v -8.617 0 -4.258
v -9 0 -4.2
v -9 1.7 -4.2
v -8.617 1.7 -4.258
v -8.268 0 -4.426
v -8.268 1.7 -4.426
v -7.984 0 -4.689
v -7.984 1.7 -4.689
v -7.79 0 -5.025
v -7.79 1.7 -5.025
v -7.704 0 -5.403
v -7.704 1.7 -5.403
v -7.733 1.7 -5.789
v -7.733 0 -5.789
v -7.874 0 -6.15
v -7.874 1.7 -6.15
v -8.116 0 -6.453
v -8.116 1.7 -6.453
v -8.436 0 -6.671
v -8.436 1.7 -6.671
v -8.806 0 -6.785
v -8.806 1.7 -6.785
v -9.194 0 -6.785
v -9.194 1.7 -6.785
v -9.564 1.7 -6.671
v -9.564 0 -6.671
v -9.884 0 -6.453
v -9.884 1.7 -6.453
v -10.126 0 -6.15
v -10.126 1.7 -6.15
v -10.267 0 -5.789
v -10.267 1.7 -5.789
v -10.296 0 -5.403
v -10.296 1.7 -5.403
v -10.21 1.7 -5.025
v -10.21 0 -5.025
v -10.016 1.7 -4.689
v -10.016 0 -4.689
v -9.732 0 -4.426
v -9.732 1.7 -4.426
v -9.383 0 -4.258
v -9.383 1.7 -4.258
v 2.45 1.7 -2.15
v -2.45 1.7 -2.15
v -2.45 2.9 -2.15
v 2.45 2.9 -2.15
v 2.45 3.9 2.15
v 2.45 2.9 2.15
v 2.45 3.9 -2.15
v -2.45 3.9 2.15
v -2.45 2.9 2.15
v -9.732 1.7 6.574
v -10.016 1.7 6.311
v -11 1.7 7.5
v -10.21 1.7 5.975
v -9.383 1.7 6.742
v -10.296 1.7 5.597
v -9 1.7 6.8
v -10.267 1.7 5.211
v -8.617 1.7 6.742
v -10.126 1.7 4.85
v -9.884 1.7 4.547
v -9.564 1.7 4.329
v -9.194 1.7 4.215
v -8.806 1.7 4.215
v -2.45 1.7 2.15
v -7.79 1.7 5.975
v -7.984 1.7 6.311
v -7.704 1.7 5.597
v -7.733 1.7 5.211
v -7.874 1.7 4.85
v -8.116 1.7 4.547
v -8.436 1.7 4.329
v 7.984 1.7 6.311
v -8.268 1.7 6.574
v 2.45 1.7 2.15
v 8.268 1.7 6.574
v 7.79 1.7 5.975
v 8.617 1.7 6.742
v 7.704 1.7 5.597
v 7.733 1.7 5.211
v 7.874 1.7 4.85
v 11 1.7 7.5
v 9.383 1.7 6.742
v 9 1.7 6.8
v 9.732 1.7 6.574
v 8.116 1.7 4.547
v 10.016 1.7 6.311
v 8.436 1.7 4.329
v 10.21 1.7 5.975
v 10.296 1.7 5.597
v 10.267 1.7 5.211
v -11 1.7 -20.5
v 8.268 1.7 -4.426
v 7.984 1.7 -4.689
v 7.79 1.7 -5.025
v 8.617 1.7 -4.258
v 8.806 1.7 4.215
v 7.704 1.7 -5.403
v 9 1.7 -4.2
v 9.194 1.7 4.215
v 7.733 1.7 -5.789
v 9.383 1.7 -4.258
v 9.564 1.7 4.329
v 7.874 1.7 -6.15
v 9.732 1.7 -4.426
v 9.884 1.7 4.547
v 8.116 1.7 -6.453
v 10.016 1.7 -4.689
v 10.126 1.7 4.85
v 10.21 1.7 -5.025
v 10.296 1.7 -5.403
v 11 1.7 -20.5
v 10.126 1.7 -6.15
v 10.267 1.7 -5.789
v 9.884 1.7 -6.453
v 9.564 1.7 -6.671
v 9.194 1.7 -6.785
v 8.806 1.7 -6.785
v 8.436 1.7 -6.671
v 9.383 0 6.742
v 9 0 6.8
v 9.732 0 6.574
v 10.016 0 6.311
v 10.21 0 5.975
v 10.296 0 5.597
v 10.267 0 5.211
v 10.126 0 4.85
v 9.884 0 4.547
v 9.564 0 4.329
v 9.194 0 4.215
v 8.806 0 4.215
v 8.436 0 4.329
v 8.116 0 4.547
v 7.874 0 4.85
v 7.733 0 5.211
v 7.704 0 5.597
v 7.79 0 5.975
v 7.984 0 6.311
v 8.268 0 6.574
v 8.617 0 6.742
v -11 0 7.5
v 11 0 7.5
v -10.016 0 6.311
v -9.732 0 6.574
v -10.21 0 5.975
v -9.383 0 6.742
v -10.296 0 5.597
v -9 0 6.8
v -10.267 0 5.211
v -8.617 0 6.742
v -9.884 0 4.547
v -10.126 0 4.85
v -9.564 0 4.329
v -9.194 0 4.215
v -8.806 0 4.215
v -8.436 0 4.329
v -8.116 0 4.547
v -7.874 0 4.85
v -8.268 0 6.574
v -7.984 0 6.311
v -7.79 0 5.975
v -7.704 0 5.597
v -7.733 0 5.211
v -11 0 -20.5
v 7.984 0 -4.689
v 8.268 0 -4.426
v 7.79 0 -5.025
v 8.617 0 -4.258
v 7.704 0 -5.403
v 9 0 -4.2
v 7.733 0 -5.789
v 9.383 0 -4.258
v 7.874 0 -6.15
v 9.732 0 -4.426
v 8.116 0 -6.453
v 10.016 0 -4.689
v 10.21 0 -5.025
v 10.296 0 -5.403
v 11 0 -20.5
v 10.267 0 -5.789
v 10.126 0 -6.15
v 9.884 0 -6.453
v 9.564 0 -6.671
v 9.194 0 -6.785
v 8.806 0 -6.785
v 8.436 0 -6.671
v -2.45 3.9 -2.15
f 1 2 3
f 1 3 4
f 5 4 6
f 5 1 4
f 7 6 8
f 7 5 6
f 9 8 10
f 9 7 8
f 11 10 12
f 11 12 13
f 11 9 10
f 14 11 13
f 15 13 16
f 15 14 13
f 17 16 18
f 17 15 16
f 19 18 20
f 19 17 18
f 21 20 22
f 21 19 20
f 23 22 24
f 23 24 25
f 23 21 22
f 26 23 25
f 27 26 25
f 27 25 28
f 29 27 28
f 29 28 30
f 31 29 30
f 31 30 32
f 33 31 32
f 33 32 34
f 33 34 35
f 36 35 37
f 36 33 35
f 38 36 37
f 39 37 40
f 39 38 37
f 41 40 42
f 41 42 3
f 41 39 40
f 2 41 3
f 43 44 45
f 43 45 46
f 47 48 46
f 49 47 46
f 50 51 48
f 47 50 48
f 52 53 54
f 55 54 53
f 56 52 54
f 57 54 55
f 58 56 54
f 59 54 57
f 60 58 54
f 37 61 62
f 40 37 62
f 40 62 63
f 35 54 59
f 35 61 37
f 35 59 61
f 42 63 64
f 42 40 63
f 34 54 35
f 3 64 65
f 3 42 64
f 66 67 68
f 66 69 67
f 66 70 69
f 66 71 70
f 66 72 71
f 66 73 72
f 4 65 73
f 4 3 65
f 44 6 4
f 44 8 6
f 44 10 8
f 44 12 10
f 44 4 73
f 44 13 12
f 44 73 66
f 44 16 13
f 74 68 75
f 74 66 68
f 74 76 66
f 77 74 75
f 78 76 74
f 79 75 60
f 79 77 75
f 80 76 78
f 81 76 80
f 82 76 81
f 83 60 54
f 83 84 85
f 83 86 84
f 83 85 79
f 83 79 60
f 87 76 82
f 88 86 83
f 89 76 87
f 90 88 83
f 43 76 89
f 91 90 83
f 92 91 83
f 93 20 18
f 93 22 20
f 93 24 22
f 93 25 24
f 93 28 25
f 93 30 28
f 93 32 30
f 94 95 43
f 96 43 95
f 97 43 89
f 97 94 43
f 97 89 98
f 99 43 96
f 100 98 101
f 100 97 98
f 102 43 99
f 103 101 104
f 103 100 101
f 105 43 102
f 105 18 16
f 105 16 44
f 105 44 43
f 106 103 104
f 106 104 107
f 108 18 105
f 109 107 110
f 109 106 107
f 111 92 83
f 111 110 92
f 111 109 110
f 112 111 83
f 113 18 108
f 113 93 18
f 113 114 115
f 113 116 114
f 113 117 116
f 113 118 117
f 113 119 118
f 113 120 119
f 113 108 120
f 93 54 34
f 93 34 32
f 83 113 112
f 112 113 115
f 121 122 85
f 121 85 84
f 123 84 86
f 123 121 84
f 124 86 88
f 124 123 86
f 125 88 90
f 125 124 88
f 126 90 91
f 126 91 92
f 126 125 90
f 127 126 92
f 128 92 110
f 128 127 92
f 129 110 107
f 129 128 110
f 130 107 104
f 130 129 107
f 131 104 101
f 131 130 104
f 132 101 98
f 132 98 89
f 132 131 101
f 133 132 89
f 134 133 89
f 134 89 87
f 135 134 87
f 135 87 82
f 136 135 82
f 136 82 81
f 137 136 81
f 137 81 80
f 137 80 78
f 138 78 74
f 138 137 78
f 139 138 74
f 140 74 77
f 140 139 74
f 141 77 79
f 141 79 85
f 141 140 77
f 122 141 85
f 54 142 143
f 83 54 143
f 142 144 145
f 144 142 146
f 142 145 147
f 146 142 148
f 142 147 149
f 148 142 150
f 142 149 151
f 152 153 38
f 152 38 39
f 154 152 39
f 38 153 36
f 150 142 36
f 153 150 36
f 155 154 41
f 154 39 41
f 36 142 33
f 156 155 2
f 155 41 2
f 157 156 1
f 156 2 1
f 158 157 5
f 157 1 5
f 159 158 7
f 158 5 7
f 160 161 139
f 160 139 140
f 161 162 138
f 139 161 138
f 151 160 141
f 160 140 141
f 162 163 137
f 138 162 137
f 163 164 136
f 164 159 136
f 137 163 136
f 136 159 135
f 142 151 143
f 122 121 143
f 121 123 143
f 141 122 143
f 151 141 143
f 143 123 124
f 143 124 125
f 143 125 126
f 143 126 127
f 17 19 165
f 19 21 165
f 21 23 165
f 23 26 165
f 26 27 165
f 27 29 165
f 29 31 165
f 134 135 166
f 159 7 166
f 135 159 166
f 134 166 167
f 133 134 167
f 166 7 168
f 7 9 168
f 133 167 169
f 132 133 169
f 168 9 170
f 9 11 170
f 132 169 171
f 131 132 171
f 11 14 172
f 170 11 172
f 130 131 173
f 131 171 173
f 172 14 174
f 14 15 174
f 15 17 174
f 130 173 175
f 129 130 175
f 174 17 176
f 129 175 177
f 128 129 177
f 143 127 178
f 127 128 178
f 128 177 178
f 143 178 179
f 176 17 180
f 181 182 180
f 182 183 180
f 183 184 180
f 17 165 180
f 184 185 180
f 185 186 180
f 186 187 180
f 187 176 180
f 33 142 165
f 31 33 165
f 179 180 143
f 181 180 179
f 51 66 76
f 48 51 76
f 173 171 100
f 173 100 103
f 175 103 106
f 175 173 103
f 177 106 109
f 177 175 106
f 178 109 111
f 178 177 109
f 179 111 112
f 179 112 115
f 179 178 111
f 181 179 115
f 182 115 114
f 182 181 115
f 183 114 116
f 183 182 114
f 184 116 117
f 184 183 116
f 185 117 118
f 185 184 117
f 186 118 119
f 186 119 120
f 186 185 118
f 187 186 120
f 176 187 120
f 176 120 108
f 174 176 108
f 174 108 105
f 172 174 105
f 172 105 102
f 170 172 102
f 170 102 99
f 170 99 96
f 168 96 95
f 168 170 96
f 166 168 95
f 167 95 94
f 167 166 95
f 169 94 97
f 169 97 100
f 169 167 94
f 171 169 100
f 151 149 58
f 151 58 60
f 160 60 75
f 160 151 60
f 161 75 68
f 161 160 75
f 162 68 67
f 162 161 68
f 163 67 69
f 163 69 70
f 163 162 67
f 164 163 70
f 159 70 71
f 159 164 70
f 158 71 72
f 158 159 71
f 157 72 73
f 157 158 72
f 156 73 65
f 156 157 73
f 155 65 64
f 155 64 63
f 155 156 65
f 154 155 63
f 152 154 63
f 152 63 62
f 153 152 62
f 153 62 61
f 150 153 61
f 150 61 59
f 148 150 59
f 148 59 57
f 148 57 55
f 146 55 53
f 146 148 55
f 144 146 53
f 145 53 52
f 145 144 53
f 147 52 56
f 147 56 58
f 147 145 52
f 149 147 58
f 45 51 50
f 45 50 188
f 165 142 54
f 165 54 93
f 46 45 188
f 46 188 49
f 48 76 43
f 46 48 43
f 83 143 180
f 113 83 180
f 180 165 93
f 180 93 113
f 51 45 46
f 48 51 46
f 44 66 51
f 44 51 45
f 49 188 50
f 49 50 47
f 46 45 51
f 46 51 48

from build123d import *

# Parameters (mm, degrees)
SKETCH1_W           = 22
SKETCH1_H           = 28
SKETCH1_R           = 1.3
BOSS_EXTRUDE1_DEPTH = 1.7
SKETCH2_W           = 4.9
SKETCH2_H           = 4.3
BOSS_EXTRUDE2_DEPTH = 1.2
SKETCH3_W           = 4.9
SKETCH3_H           = 4.3
BOSS_EXTRUDE3_DEPTH = 1


with BuildPart() as part:
    # Sketch1 → Boss-Extrude1 (new body)
    with BuildSketch(Plane(origin=(0, 0, 0), x_dir=(1, 0, 0), z_dir=(0, 1, 0))):
        with Locations((0, 6.5)):
            Rectangle(SKETCH1_W, SKETCH1_H)
        with Locations(Location((-9, -5.5, 0), (0, 0, 270))):
            Circle(SKETCH1_R, mode=Mode.SUBTRACT)
        with Locations(Location((9, -5.5, 0), (0, 0, 270))):
            Circle(SKETCH1_R, mode=Mode.SUBTRACT)
        with Locations(Location((9, 5.5, 0), (0, 0, 270))):
            Circle(SKETCH1_R, mode=Mode.SUBTRACT)
        with Locations(Location((-9, 5.5, 0), (0, 0, 270))):
            Circle(SKETCH1_R, mode=Mode.SUBTRACT)
    extrude(amount=BOSS_EXTRUDE1_DEPTH)

    # Sketch2 → Boss-Extrude2 (add)
    with BuildSketch(Plane(origin=(0, 1.7, 0), x_dir=(1, 0, 0), z_dir=(0, 1, 0))):
        Rectangle(SKETCH2_W, SKETCH2_H)
    extrude(amount=BOSS_EXTRUDE2_DEPTH)


with BuildPart() as body_2:
    # Sketch3 → Boss-Extrude3 (new body)
    with BuildSketch(Plane(origin=(0, 2.9, 0), x_dir=(1, 0, 0), z_dir=(0, 1, 0))):
        Rectangle(SKETCH3_W, SKETCH3_H)
    extrude(amount=BOSS_EXTRUDE3_DEPTH)


solid = Compound([part.part, body_2.part])
